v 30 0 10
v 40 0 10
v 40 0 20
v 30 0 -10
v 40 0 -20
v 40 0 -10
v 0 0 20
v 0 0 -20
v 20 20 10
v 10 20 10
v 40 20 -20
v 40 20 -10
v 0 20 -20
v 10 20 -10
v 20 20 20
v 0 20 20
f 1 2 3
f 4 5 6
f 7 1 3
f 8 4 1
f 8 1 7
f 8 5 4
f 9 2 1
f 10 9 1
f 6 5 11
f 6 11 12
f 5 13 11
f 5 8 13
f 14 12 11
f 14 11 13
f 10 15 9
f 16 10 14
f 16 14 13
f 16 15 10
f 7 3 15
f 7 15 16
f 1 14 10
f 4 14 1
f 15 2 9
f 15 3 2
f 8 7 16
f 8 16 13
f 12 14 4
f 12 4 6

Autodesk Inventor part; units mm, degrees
ref_plane "YZ Plane" through (0, 0, 0) normal (1, 0, 0) x (0, 1, 0)
ref_plane "XZ Plane" through (0, 0, 0) normal (0, 1, 0) x (-1, 0, 0)
ref_plane "XY Plane" through (0, 0, 0) normal (0, 0, 1) x (1, 0, 0)
sketch "草圖1" plane through (0, 0, 0) normal (0, 1, 0) x (-1, 0, 0)
  line L0 (0, -20) -> (-40, -20)
  line L1 (-40, -20) -> (-40, 20)
  line L2 (-40, 20) -> (0, 20)
  line L3 (0, 20) -> (0, -20)
  point P0 (0, 0)
  point P1 (0, 0)
  dimension "d0" = 40
  dimension "d1" = 40
extrude "擠出1" add sketch "草圖1" along normal blind 20
sketch "草圖2" plane through (0, 20, 0) normal (0, 1, 0) x (1, 0, 0)
  line L0 (0, 20) -> (40, 20) projected
  line L1 (40, 20) -> (40, -20) projected
  line L2 (40, -20) -> (0, -20) projected
  line L3 (0, -20) -> (0, 20) projected
  line L4 (10, 10) -> (40, 10)
  line L5 (40, 10) -> (40, -10)
  line L6 (40, -10) -> (10, -10)
  line L7 (10, -10) -> (10, 10)
  point P0 (0, 0)
  point P1 (40, 0)
  dimension "d4" = 20
  dimension "d5" = 30
extrude "擠出2" cut sketch "草圖2" against normal through all contours L1 L6 L7 L4
sketch "草圖3" plane through (0, 0, 20) normal (0, 0, 1) x (1, 0, 0)
  line L0 (40, 0) -> (0, 0) projected
  line L1 (0, 0) -> (0, 20) projected
  line L2 (0, 20) -> (40, 20) projected
  line L3 (40, 20) -> (40, 0) projected
  line L4 (40, 0) -> (40, 20) projected
  line L5 (40, 0) -> (20, 20)
  dimension "d8" = 20
extrude "擠出3" cut sketch "草圖3" against normal blind 13 contours L5 L2 L3
sketch "草圖4" plane through (10, 20, -10) normal (0, 0, 1) x (1, 0, 0)
  line L0 (-10, 0) -> (0, 0) projected
  line L1 (0, 0) -> (30, 0) projected
  line L2 (30, 0) -> (30, -20) projected
  line L3 (30, -20) -> (0, -20) projected
  line L4 (0, -20) -> (-10, -20) projected
  line L5 (-10, -20) -> (-10, 0) projected
  line L6 (0, 0) -> (0, -20) projected
  line L7 (0, 0) -> (20, -20)
  line L8 (30, -20) -> (-10, -20) projected
  dimension "d11" = 30
extrude "擠出4" add sketch "草圖4" along normal up to surface (20 mm away) contours L7 L3 L6
properties part number "48" material "鋼、碳鋼"
